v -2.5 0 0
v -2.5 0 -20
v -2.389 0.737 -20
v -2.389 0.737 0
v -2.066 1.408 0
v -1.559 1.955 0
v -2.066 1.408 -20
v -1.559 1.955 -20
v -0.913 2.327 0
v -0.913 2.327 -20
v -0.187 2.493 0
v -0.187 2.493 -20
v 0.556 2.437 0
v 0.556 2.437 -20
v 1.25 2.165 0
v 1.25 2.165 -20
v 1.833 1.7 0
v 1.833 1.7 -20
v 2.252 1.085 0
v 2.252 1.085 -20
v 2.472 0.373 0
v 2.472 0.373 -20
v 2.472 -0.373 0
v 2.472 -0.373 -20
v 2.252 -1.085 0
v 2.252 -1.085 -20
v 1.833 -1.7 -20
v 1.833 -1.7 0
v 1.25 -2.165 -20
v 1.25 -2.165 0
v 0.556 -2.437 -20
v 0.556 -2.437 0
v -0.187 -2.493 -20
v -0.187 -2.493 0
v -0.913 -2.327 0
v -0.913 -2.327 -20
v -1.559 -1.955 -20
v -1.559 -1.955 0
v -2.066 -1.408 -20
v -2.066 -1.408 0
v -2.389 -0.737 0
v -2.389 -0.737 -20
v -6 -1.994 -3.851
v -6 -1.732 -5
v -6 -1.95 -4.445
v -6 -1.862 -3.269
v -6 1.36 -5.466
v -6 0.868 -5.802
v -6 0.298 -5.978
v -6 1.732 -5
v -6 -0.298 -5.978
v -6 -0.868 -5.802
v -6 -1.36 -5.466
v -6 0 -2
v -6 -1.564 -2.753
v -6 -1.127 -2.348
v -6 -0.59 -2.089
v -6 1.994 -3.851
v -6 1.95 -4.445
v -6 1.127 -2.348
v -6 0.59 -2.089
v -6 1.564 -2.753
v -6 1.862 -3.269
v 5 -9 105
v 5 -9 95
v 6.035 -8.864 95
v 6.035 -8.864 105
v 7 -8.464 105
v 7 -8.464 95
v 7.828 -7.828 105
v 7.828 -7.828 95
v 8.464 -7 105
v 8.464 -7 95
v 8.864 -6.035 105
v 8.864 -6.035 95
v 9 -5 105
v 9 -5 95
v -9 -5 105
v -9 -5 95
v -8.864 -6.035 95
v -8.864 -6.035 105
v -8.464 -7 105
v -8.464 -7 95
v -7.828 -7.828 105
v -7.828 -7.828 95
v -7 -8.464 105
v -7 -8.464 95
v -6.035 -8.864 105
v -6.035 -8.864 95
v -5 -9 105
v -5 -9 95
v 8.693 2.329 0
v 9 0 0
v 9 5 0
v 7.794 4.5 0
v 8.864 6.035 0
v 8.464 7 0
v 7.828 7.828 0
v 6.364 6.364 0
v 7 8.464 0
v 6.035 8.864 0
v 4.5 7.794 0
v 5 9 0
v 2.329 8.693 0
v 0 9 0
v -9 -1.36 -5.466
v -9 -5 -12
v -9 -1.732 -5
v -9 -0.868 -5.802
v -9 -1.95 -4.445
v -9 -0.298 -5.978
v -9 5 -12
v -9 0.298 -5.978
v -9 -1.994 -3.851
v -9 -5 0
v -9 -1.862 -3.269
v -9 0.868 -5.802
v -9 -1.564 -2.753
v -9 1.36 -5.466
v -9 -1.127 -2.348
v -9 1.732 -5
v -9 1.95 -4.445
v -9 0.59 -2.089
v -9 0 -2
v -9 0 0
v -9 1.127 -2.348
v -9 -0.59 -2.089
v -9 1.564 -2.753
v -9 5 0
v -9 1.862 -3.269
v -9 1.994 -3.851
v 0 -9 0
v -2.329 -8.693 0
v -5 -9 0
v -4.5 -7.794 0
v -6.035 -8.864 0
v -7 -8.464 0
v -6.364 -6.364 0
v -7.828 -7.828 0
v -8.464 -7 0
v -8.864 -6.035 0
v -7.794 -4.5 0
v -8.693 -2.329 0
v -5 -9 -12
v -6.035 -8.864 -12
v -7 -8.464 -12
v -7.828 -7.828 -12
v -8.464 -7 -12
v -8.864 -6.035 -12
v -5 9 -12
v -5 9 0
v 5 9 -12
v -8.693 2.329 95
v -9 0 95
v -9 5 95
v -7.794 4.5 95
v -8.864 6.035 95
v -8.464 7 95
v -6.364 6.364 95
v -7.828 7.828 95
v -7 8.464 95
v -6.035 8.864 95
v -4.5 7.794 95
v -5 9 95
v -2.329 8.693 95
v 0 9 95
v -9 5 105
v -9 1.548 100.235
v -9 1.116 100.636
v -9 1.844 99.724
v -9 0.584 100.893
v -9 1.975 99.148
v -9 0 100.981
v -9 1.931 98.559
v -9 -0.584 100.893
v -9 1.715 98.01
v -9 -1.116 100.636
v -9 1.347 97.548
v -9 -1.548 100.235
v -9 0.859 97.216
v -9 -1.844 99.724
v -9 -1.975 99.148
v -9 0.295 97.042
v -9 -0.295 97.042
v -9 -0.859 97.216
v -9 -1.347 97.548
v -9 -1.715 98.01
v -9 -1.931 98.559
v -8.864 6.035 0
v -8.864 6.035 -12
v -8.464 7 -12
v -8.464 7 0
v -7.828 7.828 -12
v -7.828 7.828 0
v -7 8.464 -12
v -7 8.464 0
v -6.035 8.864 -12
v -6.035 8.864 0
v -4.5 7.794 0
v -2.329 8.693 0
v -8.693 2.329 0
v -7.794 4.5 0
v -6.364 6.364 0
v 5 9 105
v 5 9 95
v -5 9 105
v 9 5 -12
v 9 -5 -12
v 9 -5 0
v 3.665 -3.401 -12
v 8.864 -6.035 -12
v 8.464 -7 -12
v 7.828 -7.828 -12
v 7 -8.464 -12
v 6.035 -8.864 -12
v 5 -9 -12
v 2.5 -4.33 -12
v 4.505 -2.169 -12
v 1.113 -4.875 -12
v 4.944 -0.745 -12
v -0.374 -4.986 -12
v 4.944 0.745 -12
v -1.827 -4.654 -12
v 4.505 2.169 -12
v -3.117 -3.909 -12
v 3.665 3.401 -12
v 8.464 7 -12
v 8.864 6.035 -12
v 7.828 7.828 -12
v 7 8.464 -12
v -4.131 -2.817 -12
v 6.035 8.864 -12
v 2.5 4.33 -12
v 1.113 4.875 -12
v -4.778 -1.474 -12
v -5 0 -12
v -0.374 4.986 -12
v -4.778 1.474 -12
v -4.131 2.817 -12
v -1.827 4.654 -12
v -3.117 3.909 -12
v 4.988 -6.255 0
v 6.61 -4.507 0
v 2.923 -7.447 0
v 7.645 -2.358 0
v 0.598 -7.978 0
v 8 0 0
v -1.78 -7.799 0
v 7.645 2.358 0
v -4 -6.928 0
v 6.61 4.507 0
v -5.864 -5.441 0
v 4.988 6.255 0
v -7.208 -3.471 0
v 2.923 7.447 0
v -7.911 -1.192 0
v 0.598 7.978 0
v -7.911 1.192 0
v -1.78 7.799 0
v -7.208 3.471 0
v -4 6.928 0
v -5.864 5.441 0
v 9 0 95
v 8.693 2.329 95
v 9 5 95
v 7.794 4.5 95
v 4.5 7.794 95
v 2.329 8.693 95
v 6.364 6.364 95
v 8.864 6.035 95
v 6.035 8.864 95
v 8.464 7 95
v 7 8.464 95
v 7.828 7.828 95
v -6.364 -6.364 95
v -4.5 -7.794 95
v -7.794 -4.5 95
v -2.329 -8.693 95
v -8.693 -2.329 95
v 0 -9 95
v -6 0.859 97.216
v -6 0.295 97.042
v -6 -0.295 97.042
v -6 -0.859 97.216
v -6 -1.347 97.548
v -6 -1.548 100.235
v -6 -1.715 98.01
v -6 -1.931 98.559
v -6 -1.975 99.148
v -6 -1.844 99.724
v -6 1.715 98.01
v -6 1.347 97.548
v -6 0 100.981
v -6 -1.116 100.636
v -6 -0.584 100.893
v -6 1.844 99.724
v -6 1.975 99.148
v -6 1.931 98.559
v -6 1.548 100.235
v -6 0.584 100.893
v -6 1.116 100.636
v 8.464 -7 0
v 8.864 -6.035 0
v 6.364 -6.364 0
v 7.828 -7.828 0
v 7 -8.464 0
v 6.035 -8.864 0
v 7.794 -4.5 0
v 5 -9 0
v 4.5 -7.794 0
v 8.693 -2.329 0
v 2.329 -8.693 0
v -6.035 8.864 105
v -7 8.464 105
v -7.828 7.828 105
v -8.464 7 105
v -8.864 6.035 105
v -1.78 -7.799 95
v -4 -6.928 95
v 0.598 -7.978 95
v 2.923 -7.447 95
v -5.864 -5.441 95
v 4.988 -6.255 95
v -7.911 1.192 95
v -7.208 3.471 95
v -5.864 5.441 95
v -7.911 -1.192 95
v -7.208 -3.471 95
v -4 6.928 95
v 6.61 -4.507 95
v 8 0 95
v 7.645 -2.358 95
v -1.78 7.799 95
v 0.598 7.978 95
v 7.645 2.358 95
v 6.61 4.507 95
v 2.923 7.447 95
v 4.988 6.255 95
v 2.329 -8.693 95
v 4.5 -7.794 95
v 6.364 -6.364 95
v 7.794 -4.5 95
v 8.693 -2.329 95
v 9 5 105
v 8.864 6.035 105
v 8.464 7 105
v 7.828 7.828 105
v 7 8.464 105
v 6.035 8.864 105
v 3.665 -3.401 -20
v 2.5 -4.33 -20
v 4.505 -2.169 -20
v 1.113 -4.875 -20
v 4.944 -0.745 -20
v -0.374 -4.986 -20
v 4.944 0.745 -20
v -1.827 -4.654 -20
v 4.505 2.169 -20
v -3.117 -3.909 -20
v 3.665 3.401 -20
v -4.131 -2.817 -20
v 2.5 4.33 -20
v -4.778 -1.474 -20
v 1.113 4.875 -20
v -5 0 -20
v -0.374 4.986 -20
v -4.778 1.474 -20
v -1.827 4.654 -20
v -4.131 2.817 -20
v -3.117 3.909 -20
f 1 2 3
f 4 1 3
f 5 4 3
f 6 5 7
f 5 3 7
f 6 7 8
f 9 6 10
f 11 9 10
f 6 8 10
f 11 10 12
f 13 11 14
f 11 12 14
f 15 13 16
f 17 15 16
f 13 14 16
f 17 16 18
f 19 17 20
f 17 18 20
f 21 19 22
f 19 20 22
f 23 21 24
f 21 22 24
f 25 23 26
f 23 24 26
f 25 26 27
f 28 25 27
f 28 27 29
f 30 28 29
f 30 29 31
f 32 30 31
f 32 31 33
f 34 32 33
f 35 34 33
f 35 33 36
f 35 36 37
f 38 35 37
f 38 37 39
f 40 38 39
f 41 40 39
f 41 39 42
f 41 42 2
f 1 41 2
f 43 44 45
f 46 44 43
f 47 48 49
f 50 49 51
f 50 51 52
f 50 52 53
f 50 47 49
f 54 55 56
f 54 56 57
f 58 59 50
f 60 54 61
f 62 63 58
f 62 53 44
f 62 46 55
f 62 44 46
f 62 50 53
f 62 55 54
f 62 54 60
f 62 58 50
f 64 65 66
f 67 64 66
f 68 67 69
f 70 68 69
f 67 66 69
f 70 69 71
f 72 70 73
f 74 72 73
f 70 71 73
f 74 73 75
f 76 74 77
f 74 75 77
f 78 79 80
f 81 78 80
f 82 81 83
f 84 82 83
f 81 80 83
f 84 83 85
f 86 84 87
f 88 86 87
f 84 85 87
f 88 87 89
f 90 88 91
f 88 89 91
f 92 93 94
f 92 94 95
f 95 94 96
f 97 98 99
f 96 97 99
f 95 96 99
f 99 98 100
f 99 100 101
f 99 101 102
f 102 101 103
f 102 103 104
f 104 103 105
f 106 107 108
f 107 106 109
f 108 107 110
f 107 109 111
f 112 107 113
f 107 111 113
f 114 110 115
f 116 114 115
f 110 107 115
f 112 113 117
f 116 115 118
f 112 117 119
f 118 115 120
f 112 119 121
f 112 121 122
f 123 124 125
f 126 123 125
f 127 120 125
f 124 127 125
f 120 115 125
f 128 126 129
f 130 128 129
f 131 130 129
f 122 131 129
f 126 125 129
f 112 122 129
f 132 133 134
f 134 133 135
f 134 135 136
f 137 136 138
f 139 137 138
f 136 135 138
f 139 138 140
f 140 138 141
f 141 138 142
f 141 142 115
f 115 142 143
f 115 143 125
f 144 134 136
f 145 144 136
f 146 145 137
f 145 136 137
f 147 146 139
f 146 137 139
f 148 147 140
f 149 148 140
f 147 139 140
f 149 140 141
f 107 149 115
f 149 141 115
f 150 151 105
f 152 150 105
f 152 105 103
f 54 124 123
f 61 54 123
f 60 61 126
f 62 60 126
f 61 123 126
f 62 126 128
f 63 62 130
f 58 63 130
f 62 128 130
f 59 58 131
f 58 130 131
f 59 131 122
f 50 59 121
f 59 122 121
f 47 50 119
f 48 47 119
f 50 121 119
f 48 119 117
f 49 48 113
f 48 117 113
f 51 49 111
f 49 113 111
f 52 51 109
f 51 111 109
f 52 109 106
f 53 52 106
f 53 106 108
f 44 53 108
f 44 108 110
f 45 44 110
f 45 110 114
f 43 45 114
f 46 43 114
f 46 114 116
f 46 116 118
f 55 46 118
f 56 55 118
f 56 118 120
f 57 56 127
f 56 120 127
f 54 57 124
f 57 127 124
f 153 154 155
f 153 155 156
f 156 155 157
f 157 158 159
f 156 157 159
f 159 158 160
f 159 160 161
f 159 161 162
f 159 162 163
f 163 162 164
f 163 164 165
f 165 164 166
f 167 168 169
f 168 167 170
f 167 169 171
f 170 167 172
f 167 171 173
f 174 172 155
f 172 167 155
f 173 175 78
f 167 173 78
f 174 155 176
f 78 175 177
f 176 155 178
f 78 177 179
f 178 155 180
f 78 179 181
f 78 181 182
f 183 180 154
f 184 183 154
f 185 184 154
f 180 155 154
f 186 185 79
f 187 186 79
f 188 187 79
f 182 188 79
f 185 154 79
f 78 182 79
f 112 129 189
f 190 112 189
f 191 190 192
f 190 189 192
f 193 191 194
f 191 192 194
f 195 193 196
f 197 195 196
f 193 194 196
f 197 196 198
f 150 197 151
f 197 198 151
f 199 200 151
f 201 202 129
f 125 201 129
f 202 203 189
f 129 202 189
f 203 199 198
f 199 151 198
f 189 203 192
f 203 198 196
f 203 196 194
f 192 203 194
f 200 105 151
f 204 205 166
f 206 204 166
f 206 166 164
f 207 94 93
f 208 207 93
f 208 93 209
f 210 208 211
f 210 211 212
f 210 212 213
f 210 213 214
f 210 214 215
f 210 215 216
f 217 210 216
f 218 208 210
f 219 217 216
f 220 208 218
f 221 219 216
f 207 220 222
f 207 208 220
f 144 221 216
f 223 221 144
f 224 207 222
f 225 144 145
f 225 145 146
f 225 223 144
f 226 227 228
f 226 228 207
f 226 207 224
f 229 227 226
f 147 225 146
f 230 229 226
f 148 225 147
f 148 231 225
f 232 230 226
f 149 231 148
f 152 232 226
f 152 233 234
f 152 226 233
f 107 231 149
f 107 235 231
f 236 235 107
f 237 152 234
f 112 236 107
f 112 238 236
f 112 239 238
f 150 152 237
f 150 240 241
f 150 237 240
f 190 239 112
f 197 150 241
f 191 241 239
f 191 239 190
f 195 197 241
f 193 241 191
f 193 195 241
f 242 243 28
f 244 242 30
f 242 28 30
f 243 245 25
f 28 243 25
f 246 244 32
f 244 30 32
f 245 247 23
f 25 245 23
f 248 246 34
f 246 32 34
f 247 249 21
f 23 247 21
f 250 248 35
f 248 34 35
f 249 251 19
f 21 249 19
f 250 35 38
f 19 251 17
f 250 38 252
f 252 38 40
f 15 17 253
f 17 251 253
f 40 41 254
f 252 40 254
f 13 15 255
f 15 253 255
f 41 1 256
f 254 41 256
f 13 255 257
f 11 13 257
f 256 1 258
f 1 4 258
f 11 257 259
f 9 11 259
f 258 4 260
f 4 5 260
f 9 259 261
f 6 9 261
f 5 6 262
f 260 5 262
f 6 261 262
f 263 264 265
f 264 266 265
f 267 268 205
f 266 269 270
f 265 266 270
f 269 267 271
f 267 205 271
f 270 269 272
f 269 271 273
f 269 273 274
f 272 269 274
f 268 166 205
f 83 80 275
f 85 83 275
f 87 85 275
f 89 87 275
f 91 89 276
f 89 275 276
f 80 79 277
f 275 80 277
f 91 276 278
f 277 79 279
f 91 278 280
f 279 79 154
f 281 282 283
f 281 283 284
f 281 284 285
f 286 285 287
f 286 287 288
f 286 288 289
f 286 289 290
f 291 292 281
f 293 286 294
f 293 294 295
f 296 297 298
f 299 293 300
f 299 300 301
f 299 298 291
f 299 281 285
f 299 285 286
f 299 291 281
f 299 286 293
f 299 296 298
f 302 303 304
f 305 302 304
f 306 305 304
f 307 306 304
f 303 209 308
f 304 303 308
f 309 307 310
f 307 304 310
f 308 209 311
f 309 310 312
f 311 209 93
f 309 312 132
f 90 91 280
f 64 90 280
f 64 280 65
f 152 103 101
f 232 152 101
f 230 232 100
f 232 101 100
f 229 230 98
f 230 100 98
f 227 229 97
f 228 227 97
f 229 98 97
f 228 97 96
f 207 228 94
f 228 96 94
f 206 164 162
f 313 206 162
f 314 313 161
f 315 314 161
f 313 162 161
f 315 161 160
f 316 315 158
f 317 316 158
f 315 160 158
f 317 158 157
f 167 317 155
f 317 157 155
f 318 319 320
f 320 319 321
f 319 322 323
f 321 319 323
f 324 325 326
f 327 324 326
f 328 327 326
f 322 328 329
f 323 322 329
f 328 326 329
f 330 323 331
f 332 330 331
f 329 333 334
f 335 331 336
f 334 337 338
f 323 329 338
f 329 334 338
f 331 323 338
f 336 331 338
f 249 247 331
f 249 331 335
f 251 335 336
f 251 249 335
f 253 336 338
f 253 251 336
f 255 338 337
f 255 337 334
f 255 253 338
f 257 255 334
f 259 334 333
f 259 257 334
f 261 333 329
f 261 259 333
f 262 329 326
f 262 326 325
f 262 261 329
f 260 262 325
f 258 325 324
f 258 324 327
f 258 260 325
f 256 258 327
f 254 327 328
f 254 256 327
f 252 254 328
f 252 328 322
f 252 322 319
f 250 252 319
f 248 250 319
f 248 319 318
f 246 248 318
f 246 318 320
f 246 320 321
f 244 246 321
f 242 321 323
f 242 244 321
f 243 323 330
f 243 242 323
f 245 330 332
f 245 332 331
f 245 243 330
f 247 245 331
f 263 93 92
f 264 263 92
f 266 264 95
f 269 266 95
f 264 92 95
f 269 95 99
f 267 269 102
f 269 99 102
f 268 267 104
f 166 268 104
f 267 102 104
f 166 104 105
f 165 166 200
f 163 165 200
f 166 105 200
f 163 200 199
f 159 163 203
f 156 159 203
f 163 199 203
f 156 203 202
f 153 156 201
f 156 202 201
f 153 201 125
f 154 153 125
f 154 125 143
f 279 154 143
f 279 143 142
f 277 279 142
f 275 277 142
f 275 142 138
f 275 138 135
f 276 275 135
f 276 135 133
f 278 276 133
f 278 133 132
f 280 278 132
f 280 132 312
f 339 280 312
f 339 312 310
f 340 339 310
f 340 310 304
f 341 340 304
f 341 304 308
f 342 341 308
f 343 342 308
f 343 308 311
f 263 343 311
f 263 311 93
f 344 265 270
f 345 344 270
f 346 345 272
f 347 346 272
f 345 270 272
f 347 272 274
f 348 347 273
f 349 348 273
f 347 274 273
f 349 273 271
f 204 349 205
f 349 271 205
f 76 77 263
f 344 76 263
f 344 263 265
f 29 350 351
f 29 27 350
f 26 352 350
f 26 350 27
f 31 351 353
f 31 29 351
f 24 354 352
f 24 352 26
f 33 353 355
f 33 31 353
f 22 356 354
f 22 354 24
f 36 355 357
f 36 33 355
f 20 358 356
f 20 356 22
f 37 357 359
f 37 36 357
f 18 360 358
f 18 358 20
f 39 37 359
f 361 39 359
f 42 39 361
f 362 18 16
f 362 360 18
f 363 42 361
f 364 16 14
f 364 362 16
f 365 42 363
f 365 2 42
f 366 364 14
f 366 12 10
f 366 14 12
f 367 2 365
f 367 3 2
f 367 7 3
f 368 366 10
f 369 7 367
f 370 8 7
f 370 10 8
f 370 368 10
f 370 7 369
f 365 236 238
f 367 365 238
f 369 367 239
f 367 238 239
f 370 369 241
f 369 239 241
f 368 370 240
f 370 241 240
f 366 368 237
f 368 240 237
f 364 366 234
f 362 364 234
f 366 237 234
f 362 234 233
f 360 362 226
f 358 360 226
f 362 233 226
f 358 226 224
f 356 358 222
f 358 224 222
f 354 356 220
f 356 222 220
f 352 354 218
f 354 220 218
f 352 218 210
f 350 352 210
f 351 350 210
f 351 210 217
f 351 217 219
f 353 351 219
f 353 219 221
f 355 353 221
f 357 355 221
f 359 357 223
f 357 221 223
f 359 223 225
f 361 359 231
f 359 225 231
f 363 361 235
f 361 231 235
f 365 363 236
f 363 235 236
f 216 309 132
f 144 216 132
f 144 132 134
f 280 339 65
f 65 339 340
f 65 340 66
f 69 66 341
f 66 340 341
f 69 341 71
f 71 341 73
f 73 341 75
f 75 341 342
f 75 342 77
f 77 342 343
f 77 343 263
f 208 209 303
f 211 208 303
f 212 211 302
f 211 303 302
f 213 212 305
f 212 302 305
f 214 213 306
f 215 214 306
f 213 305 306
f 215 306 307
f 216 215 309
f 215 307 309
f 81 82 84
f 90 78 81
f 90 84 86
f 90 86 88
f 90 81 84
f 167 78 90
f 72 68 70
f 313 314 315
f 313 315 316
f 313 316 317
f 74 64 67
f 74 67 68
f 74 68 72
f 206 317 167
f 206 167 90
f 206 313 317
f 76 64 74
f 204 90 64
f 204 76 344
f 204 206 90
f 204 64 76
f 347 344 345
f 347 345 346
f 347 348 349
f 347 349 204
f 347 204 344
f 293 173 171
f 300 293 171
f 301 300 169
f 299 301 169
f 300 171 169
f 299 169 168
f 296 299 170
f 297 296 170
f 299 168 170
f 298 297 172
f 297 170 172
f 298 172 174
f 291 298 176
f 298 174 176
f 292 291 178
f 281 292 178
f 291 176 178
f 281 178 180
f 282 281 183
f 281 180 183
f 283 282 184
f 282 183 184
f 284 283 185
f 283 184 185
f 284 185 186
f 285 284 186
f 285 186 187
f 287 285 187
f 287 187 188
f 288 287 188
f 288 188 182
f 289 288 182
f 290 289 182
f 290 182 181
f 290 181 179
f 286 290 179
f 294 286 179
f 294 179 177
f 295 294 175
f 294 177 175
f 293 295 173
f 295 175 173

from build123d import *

# Parameters (mm, degrees)
SKETCH_1_R          = 9
SKETCH_1_R_2        = 8
EXTRUDE_1_DEPTH     = 95
EXTRUDE_2_DEPTH     = 10
EXTRUDE_3_DEPTH     = 12
SKETCH_4_R          = 5
EXTRUDE_4_DEPTH     = 8
SKETCH_5_R          = 2.5
CUT_EXTRUDE_1_DEPTH = 38
SKETCH_6_R          = 2
SKETCH_6_R_2        = 1.980516498
CUT_EXTRUDE_3_DEPTH = 3


with BuildPart() as part:
    # 草图1 → 凸台-拉伸1 (new body)
    with BuildSketch(Plane.XY):
        Circle(SKETCH_1_R)
        Circle(SKETCH_1_R_2, mode=Mode.SUBTRACT)
    extrude(amount=EXTRUDE_1_DEPTH)

    # 草图2 → 凸台-拉伸2 (add)
    with BuildSketch(Plane.XY.offset(95)):
        with BuildLine():
            Line((-5, -9), (5, -9))
            ThreePointArc((5, -9), (7.828427125, -7.828427125), (9, -5))
            Line((9, -5), (9, 5))
            ThreePointArc((9, 5), (7.828427125, 7.828427125), (5, 9))
            Line((5, 9), (-5, 9))
            ThreePointArc((-5, 9), (-7.828427125, 7.828427125), (-9, 5))
            Line((-9, 5), (-9, -5))
            ThreePointArc((-9, -5), (-7.828427125, -7.828427125), (-5, -9))
        make_face()
    extrude(amount=EXTRUDE_2_DEPTH)

    # 草图3 → 凸台-拉伸3 (add)
    with BuildSketch(Plane(origin=(0, 0, 0), x_dir=(-1, 0, 0), z_dir=(0, 0, -1))):
        with BuildLine():
            Line((-5, -9), (5, -9))
            ThreePointArc((5, -9), (7.828427125, -7.828427125), (9, -5))
            Line((9, -5), (9, 5))
            ThreePointArc((9, 5), (7.828427125, 7.828427125), (5, 9))
            Line((5, 9), (-5, 9))
            ThreePointArc((-5, 9), (-7.828427125, 7.828427125), (-9, 5))
            Line((-9, 5), (-9, -5))
            ThreePointArc((-9, -5), (-7.828427125, -7.828427125), (-5, -9))
        make_face()
    extrude(amount=EXTRUDE_3_DEPTH)

    # 草图4 → 凸台-拉伸4 (add)
    with BuildSketch(Plane(origin=(0, 0, -12), x_dir=(-1, 0, 0), z_dir=(0, 0, -1))):
        Circle(SKETCH_4_R)
    extrude(amount=EXTRUDE_4_DEPTH)

    # 草图5 → 切除-拉伸1 (cut)
    with BuildSketch(Plane(origin=(0, 0, -20), x_dir=(-1, 0, 0), z_dir=(0, 0, -1))):
        Circle(SKETCH_5_R)
    extrude(amount=-CUT_EXTRUDE_1_DEPTH, mode=Mode.SUBTRACT)

    # 草图6 → 切除-拉伸3 (cut)
    with BuildSketch(Plane.ZY.offset(9)):
        with Locations((-4, 0)):
            Circle(SKETCH_6_R)
        with Locations((99, 0)):
            Circle(SKETCH_6_R_2)
    extrude(amount=-CUT_EXTRUDE_3_DEPTH, mode=Mode.SUBTRACT)


solid = part.part
